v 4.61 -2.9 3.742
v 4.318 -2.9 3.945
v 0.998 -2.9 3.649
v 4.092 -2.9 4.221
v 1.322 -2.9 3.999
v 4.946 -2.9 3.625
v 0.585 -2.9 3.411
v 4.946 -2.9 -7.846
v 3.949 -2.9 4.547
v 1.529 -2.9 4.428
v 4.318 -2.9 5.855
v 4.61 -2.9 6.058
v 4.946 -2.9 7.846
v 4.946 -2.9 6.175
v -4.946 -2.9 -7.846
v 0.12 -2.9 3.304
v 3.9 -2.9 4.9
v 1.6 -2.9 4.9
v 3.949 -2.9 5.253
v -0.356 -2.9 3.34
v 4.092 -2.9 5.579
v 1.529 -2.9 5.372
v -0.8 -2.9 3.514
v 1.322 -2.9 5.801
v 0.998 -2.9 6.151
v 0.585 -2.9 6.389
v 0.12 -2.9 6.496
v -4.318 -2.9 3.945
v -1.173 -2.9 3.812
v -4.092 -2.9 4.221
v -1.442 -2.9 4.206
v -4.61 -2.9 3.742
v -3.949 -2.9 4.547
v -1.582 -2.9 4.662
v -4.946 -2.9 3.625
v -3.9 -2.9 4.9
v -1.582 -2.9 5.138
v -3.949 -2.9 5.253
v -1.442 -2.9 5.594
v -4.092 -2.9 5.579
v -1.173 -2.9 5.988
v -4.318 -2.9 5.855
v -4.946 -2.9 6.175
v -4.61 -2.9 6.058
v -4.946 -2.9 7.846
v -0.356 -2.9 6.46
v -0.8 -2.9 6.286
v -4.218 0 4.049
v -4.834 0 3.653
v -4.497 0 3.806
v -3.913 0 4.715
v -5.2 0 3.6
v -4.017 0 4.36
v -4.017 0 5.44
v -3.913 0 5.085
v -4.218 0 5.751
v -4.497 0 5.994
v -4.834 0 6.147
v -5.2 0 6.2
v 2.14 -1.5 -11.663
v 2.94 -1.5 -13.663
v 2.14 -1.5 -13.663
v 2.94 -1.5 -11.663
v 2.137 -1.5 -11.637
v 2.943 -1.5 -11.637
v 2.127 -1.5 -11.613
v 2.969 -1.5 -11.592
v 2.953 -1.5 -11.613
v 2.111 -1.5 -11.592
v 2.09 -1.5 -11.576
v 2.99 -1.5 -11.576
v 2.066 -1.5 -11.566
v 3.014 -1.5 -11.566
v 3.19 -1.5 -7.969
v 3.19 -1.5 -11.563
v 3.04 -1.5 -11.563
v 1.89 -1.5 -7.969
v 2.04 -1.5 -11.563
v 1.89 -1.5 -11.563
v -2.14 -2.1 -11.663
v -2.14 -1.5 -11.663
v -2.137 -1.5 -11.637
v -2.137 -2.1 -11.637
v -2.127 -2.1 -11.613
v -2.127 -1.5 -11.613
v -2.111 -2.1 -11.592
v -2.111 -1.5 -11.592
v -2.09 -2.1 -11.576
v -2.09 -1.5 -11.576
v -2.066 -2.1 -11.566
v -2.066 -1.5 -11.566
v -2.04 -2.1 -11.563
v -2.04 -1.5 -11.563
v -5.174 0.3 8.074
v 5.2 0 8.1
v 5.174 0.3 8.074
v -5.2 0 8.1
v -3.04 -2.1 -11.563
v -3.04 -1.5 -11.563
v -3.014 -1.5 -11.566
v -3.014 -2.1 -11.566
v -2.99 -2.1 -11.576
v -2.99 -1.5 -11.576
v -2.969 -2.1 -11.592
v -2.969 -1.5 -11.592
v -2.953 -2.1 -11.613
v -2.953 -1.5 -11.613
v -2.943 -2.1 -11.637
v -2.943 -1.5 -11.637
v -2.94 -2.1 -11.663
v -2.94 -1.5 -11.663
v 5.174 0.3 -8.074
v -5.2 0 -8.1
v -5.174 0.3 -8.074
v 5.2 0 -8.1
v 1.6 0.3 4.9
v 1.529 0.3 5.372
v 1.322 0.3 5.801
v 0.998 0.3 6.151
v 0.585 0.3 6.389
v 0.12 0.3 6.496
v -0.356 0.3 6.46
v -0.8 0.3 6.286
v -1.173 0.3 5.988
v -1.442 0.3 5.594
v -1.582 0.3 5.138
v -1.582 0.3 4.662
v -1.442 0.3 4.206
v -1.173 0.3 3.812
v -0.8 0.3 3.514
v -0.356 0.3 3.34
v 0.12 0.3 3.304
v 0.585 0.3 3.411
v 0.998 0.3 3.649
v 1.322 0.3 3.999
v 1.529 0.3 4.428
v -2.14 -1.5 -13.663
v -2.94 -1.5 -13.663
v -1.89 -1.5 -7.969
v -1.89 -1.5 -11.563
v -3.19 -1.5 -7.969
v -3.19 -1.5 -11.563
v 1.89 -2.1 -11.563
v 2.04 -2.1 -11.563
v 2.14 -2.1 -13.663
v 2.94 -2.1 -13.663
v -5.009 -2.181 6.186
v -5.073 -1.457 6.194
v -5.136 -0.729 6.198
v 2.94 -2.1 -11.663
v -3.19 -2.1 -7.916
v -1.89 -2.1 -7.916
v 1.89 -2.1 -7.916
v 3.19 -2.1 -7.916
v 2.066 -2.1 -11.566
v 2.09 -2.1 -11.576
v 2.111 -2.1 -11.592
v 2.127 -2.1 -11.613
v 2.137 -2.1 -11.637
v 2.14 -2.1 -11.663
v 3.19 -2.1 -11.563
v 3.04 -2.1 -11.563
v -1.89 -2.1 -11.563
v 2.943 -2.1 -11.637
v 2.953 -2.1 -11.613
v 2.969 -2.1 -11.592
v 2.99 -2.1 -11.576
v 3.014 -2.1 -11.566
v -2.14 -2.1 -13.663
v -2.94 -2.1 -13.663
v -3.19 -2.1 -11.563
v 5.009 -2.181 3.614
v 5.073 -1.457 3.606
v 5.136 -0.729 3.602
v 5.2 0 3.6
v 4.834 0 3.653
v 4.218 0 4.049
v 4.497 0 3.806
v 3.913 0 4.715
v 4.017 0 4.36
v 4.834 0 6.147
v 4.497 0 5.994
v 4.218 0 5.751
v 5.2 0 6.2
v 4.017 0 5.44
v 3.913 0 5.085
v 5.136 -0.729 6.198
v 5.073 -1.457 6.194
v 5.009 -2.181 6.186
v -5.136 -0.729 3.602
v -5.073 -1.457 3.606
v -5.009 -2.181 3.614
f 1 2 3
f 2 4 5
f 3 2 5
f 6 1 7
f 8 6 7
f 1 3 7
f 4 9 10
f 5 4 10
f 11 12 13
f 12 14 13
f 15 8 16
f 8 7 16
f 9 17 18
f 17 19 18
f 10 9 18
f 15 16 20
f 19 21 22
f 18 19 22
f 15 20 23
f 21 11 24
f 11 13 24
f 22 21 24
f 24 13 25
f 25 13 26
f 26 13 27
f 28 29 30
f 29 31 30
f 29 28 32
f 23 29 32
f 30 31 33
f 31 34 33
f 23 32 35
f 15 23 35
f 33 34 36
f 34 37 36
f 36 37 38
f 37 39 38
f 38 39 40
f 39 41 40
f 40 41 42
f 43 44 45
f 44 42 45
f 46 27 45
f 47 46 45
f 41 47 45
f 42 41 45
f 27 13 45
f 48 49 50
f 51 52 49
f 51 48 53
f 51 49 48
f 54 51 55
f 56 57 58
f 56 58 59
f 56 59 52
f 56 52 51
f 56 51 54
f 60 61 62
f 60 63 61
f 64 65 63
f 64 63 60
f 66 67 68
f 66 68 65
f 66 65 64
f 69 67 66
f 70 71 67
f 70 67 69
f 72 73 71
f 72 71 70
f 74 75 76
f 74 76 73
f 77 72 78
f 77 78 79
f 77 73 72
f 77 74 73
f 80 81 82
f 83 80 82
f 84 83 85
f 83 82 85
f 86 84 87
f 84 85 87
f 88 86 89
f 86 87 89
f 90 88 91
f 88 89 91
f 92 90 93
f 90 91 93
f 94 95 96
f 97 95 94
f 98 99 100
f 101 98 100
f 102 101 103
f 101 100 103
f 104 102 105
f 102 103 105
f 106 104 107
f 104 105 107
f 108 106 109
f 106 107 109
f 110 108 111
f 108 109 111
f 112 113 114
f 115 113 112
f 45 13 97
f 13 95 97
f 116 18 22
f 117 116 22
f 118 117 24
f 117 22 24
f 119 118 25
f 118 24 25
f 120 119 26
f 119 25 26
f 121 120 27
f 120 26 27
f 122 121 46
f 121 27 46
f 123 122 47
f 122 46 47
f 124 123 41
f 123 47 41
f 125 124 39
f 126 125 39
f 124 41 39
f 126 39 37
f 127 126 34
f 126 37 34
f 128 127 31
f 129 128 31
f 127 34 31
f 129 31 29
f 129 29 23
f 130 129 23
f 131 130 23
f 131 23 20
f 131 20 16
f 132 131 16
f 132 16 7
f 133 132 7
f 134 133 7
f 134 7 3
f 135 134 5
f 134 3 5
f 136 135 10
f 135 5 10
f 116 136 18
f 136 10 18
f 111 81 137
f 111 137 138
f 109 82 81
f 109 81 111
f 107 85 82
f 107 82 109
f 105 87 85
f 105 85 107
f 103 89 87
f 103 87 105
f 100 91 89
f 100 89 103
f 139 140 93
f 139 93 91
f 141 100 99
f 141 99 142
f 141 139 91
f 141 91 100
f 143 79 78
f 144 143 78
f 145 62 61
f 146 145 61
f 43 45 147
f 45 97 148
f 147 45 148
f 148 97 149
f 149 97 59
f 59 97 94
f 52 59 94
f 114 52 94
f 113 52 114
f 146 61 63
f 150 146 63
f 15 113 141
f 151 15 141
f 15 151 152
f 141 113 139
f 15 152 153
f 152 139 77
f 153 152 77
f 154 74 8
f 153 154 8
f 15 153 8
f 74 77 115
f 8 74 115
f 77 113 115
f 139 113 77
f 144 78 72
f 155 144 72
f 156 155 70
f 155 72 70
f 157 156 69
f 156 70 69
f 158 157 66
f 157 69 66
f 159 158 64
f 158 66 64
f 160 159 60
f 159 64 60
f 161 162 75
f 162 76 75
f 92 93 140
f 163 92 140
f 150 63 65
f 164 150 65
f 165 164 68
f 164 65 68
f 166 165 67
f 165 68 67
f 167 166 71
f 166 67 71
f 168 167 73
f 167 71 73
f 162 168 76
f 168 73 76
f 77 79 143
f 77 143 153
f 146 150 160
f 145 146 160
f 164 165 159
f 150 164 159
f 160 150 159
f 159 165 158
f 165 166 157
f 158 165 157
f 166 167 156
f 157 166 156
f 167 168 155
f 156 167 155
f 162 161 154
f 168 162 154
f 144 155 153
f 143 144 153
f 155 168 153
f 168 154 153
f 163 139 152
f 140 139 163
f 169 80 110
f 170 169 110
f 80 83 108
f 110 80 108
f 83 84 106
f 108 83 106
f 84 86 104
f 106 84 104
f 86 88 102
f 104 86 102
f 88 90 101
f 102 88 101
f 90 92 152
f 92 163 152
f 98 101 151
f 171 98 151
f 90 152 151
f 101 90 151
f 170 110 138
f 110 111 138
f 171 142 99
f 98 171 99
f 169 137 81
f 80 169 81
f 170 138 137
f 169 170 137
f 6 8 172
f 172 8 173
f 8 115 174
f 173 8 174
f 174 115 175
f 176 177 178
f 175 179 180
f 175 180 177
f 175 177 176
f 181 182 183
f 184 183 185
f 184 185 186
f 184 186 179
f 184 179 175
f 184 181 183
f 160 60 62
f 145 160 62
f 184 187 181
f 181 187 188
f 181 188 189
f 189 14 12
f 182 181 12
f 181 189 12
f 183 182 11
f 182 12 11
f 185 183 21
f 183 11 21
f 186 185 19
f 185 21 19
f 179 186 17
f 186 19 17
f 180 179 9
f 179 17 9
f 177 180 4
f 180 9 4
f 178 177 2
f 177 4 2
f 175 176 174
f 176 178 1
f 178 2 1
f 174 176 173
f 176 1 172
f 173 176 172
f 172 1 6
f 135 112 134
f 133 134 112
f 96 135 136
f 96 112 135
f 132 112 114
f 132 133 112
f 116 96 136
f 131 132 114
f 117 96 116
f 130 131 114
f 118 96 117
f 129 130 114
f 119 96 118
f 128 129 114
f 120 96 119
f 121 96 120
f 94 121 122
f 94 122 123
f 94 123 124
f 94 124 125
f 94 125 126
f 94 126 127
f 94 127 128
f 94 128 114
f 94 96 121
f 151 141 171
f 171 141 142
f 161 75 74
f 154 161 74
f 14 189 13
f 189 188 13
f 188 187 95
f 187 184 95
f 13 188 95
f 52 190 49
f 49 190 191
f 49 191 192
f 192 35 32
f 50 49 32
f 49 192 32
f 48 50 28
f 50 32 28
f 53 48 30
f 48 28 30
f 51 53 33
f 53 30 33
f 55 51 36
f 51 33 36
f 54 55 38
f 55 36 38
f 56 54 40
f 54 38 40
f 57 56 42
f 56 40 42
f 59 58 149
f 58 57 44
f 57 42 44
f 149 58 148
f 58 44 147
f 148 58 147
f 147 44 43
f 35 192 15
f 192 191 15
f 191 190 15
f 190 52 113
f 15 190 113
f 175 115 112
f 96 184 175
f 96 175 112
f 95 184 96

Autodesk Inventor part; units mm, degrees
ref_plane "YZ Plane" through (0, 0, 0) normal (1, 0, 0) x (0, 1, 0)
ref_plane "XY Plane" through (0, 0, 0) normal (0, 0, 1) x (1, 0, 0)
sketch "Sketch1" plane through (0, 0, 0) normal (0, 1, 0) x (-1, 0, 0)
  line L0 (5.2, -8.1) -> (-5.2, -8.1)
  line L1 (-5.2, -8.1) -> (-5.2, 8.1)
  line L2 (-5.2, 8.1) -> (5.2, 8.1)
  line L3 (5.2, 8.1) -> (5.2, -8.1)
  line L4 (5.2, -8.1) -> (-5.2, 8.1) construction
  line L5 (-5.2, -8.1) -> (5.2, 8.1) construction
  point P0 (0, 0)
  dimension "d0" = 16.2
  dimension "d1" = 10.4
extrude "Extrusion1" add sketch "Sketch1" along normal blind 0.3 draft -5 and the other way blind 2.9 draft -5
sketch "Sketch2" plane through (0, -2.9, 0) normal (0, -1, 0) x (1, 0, 0)
  line L0 (-4.9463, -7.8463) -> (-4.9463, 7.8463) projected
  line L1 (4.9463, -7.8463) -> (-4.9463, -7.8463) projected
  line L2 (4.9463, 7.8463) -> (4.9463, -7.8463) projected
  line L3 (-4.9463, 7.8463) -> (4.9463, 7.8463) projected
  circle A0 centre (0, 4.9) radius 1.6
  line L4 (5.2, 8.1) -> (-5.2, 8.1) projected
  point P0 (0, 0)
  dimension "d6" = 3.2
  dimension "d7" = 3.2
extrude "Extrusion2" cut sketch "Sketch2" against normal through all contours A0
sketch "Sketch3" plane through (0, -2.9, 0) normal (0, -1, 0) x (1, 0, 0)
  line L0 (-4.9463, -7.8463) -> (-4.9463, 7.8463) projected
  line L1 (-5.2, 8.1) -> (-4.9463, 7.8463) projected
  line L2 (-5.2, 8.1) -> (-5.2, -8.1) projected
  line L3 (-5.2, -8.1) -> (-4.9463, -7.8463) projected
  circle A0 centre (0, 4.9) radius 1.6 projected
  line L4 (-4.9463, -7.8463) -> (-4.9463, 7.8463) projected
  line L5 (4.9463, -7.8463) -> (-4.9463, -7.8463) projected
  line L6 (4.9463, 7.8463) -> (4.9463, -7.8463) projected
  line L7 (-4.9463, 7.8463) -> (4.9463, 7.8463) projected
  line L8 (4.9463, 7.8463) -> (4.9463, -7.8463) projected
  line L9 (5.2, -8.1) -> (4.9463, -7.8463) projected
  line L10 (5.2, -8.1) -> (5.2, 8.1) projected
  line L11 (5.2, 8.1) -> (4.9463, 7.8463) projected
  line L12 (-5.2, 8.1) -> (-5.2, -8.1) projected
  arc A1 (-5.2, 3.6) -> (-5.2, 6.2) centre (-5.2, 4.9) ccw
  line L13 (5.2, -8.1) -> (5.2, 8.1) projected
  arc A2 (5.2, 6.2) -> (5.2, 3.6) centre (5.2, 4.9) ccw
  point P0 (0, 0)
  dimension "d10" = 1.3
extrude "Extrusion3" cut sketch "Sketch3" against normal up to surface (2.9 mm away) contours A1 L2 L0 | L0 A1 | A2 L6 | L6 A2 L10
ref_plane "Work Plane1" through (0, -1.5, 0) normal (0, 1, 0) x (-1, 0, 0)
sketch "Sketch4" plane through (0, -1.5, 0) normal (0, 1, 0) x (-1, 0, 0)
  line L0 (-4.9463, -7.8463) -> (4.9463, -7.8463) projected
  line L1 (5.2, -8.1) -> (4.9463, -7.8463) projected
  line L2 (5.2, -8.1) -> (-5.2, -8.1) projected
  line L3 (-5.2, -8.1) -> (-4.9463, -7.8463) projected
  line L4 (3.19, -7.8463) -> (3.19, -11.563)
  line L5 (5.2, -8.1) -> (-5.2, -8.1) projected
  line L6 (3.19, -11.563) -> (3.04, -11.563)
  arc A0 (3.04, -11.563) -> (2.94, -11.663) centre (3.04, -11.663) ccw
  line L7 (2.94, -11.663) -> (2.94, -13.663)
  line L8 (2.94, -13.663) -> (2.14, -13.663)
  line L9 (2.14, -13.663) -> (2.14, -11.663)
  arc A1 (2.14, -11.663) -> (2.04, -11.563) centre (2.04, -11.663) ccw
  line L10 (2.04, -11.563) -> (1.89, -11.563)
  line L11 (1.89, -7.8463) -> (1.89, -11.563)
  circle A2 centre (0, 4.9) radius 1.6 projected
  dimension "d21" = 0.8
  dimension "d22" = 1.3
  dimension "d23" = 0.1
  dimension "d24" = 16.463
  dimension "d25" = 1.89
  dimension "d26" = 2.1
extrude "Extrusion4" add sketch "Sketch4" against normal blind 0.6 contours L0 L4 L2 L11 | L2 L4 L6 A0 L7 L8 L9 A1 L10 L11
mirror "Mirror1" about plane through (0, 0, 0) normal (1, 0, 0) of "Extrusion4"
sketch "Sketch5" plane through (0, 0.3, 0) normal (0, 1, 0) x (1, 0, 0)
  circle A0 centre (0, -4.9) radius 1.6 projected
  line L0 (5.1738, 8.0738) -> (5.1738, -8.0738) projected
  line L1 (-5.1738, 8.0738) -> (5.1738, 8.0738) projected
  line L2 (-5.1738, -8.0738) -> (-5.1738, 8.0738) projected
  line L3 (5.1738, -8.0738) -> (-5.1738, -8.0738) projected
  line L4 (4.25, -2.237) -> (-4.25, -2.237)
  line L5 (-4.25, -2.237) -> (-4.25, 7.163)
  line L6 (-4.25, 7.163) -> (4.25, 7.163)
  line L7 (4.25, 7.163) -> (4.25, -2.237)
  point P0 (0, 0)
  point P1 (0, -2.237)
  dimension "d34" = 8.5
  dimension "d35" = 9.4
  dimension "d36" = 2.663
split_face "Split1"
properties part number "Resistor_TH-TO220" material "ABS Plastic"
